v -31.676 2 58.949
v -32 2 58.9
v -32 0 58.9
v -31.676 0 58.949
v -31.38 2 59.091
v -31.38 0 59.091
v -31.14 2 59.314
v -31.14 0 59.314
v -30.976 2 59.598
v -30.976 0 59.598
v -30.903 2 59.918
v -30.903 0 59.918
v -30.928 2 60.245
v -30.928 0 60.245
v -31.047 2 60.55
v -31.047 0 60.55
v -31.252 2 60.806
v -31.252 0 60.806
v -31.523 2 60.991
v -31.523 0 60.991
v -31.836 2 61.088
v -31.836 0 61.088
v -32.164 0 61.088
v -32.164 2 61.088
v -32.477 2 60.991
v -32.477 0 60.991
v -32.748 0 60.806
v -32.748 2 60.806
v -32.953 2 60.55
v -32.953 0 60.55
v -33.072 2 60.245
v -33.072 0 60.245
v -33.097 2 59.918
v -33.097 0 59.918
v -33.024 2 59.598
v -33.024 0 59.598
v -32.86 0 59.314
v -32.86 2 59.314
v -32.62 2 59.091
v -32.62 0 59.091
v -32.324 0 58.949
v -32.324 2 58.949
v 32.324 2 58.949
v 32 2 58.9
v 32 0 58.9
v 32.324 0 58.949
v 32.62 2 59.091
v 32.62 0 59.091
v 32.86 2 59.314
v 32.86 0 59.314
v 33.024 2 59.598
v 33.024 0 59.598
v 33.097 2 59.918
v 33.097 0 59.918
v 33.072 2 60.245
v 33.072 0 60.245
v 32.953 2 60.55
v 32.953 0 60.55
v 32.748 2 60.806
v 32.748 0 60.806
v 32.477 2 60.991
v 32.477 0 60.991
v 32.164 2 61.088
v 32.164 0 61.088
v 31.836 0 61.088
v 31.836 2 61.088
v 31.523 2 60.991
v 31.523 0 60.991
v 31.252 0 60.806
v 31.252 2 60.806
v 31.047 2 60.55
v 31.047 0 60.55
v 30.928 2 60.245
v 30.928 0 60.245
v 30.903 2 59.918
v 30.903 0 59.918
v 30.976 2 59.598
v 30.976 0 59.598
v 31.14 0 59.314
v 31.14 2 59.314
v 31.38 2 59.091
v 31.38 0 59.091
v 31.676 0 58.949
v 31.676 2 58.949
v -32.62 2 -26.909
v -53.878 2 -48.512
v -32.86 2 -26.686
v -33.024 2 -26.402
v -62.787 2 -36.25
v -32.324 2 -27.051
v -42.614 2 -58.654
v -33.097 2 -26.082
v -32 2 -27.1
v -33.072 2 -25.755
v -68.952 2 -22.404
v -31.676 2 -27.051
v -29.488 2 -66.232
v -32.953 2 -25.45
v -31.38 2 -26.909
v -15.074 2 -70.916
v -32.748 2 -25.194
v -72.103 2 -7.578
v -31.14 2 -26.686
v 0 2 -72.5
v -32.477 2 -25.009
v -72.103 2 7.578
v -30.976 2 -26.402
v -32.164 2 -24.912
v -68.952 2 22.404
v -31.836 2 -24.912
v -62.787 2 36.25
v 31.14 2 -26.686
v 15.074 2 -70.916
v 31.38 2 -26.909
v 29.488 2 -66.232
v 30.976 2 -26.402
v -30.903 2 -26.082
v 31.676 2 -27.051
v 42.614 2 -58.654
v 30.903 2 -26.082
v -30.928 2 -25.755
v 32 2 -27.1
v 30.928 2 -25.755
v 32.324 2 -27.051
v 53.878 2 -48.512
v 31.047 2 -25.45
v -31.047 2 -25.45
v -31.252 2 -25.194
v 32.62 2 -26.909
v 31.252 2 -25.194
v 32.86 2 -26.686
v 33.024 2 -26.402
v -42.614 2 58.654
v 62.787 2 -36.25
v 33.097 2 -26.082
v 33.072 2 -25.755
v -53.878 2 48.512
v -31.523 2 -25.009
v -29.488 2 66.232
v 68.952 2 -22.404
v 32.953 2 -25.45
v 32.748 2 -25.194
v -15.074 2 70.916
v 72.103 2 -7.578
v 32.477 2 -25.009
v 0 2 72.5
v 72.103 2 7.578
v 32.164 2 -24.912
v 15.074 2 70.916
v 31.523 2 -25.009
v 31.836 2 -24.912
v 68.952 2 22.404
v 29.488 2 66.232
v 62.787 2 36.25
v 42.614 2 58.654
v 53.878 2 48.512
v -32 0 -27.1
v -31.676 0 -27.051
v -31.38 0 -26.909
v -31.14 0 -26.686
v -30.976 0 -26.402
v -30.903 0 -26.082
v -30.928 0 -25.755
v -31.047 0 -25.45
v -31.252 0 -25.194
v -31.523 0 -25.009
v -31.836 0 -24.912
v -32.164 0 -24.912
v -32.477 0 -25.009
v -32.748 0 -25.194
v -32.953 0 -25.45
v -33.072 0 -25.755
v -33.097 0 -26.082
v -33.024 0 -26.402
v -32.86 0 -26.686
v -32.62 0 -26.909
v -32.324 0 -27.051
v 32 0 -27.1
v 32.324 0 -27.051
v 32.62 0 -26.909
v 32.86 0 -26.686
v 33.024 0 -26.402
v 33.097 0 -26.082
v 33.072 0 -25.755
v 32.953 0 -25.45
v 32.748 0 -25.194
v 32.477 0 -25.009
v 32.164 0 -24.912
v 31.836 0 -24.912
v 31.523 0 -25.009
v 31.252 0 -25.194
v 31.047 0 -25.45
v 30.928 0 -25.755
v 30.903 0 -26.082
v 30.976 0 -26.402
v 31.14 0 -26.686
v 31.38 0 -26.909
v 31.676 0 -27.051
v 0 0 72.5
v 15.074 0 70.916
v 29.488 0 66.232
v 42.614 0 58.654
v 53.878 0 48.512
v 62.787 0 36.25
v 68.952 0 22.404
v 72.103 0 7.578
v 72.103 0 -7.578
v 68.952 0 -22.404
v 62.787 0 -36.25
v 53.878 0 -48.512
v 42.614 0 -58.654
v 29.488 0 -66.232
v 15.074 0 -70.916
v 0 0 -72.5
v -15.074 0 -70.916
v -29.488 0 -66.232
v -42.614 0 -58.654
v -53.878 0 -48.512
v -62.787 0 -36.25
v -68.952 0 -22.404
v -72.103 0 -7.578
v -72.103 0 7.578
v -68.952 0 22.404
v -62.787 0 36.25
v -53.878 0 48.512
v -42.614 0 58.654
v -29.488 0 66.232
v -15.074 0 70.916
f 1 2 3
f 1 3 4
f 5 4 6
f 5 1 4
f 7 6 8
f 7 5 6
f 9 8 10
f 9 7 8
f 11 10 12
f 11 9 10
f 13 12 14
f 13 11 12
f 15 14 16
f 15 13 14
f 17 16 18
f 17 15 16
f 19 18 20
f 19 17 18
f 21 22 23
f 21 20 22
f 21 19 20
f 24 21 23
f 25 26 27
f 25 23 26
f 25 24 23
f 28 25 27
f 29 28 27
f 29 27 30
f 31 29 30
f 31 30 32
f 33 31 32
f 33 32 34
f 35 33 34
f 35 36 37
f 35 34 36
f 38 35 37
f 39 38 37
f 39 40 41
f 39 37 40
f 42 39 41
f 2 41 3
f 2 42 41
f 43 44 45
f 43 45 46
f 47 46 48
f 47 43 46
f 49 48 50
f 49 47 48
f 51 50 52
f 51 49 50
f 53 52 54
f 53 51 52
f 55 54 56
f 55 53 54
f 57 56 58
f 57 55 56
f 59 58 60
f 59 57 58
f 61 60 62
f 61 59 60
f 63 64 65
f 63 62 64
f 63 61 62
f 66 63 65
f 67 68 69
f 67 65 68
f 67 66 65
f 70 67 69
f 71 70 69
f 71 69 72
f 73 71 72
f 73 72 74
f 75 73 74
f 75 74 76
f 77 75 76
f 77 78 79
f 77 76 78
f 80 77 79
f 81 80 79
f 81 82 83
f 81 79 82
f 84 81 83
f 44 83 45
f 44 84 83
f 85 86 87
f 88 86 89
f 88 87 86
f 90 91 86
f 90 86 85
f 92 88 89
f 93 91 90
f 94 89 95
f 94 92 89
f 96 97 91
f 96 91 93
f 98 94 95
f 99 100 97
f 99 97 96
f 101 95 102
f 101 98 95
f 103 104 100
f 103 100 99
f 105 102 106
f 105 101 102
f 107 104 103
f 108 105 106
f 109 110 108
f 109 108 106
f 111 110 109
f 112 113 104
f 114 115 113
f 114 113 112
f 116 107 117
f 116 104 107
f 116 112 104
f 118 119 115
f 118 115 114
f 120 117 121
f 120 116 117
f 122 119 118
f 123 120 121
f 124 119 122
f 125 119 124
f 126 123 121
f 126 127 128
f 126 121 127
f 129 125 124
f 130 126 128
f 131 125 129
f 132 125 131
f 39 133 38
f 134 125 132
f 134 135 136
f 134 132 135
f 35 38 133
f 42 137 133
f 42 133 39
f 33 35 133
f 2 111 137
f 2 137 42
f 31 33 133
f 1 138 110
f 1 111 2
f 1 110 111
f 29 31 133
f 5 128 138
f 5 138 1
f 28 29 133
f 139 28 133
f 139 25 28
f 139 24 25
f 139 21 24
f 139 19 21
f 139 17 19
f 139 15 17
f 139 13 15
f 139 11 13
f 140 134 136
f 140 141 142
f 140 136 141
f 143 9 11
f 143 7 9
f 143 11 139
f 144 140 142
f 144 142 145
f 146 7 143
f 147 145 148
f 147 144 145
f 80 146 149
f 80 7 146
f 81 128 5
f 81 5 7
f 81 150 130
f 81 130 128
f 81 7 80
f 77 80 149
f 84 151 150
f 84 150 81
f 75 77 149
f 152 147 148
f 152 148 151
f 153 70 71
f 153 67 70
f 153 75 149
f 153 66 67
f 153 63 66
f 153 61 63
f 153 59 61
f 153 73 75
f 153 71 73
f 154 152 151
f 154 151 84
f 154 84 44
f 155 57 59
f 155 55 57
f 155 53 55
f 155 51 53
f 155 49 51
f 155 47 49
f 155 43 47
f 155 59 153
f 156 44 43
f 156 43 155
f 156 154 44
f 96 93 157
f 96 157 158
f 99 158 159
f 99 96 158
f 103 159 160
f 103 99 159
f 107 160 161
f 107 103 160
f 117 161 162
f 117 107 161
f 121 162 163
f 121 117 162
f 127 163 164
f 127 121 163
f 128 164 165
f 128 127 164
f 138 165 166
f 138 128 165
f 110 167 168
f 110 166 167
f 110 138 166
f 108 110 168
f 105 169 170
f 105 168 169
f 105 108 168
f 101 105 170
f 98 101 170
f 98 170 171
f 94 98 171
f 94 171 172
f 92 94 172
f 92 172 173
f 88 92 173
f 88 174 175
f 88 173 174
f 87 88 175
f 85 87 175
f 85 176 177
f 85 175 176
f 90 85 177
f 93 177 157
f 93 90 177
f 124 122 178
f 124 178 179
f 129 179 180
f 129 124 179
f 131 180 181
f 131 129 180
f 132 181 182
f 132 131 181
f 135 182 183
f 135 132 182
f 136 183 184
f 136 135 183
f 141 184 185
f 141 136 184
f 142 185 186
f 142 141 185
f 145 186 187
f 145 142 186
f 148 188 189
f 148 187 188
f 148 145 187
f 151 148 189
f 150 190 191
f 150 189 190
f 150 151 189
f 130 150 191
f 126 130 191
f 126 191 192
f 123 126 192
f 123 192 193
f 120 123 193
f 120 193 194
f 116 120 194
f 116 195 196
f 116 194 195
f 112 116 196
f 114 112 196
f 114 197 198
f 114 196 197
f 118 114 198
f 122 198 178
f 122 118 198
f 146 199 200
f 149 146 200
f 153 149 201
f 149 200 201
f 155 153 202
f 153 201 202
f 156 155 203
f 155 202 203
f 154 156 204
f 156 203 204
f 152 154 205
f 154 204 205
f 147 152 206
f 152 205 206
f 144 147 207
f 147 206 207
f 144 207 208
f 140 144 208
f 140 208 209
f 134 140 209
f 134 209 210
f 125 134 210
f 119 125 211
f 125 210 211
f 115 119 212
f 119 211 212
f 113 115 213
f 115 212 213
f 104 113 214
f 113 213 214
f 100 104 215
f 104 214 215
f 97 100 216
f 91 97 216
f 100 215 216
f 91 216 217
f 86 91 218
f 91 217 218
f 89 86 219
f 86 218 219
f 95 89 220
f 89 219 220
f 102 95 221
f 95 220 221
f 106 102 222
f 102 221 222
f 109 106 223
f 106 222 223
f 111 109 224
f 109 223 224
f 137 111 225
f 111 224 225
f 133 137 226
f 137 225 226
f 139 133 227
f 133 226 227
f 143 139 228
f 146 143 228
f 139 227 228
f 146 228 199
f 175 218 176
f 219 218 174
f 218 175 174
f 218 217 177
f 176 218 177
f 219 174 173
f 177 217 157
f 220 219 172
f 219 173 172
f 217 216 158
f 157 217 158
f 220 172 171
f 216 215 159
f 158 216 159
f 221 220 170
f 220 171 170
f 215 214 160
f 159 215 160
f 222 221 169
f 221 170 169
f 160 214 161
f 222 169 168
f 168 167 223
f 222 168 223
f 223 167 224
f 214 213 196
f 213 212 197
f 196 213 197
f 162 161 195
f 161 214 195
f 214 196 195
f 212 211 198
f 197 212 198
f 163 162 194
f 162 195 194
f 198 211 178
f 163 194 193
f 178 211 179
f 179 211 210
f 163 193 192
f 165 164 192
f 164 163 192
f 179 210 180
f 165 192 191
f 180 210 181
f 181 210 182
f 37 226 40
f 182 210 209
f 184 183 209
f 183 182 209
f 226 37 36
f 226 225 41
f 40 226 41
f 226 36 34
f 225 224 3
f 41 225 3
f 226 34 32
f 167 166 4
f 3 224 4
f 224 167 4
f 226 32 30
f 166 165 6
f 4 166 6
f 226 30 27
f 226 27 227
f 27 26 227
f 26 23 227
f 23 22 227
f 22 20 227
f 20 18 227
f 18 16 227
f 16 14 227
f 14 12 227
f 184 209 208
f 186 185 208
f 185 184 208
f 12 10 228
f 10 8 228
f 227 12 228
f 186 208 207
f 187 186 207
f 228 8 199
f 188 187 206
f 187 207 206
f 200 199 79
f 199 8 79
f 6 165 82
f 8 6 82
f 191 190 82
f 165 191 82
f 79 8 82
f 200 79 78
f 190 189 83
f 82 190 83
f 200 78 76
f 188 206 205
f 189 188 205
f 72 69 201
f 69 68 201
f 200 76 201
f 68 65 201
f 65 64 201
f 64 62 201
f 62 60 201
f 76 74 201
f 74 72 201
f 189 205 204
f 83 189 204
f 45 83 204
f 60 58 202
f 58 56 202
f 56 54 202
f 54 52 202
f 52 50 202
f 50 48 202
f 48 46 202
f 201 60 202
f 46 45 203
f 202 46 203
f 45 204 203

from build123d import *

# Parameters (mm, degrees)
SKETCH_2_R               = 72.5
EXTRUDE_1_DEPTH          = 2
CUT_EXTRUDE_1_DEPTH      = 103.549987811
CUT_EXTRUDE_1_DEPTH_BACK = 103.549987811
SKETCH_3_R               = 1.1


with BuildPart() as part:
    # 草图2 → 凸台-拉伸1 (new body)
    with BuildSketch(Plane(origin=(0, 0, 0), x_dir=(1, 0, 0), z_dir=(0, 1, 0))):
        with Locations(Location((0, 0, 0), (0, 0, 270))):
            Circle(SKETCH_2_R)
    extrude(amount=EXTRUDE_1_DEPTH)

    # 草图3 → 切除-拉伸1 (cut, two sides: drawn at the far end of the back side and taken through both)
    with BuildSketch(Plane.XZ.offset(-CUT_EXTRUDE_1_DEPTH_BACK)):
        with Locations(Location((32, 60, 0), (0, 0, 270))):
            Circle(SKETCH_3_R)
        with Locations(Location((-32, 60, 0), (0, 0, 270))):
            Circle(SKETCH_3_R)
        with Locations(Location((-32, -26, 0), (0, 0, 270))):
            Circle(SKETCH_3_R)
        with Locations(Location((32, -26, 0), (0, 0, 270))):
            Circle(SKETCH_3_R)
    extrude(amount=CUT_EXTRUDE_1_DEPTH + CUT_EXTRUDE_1_DEPTH_BACK, mode=Mode.SUBTRACT)


solid = part.part
